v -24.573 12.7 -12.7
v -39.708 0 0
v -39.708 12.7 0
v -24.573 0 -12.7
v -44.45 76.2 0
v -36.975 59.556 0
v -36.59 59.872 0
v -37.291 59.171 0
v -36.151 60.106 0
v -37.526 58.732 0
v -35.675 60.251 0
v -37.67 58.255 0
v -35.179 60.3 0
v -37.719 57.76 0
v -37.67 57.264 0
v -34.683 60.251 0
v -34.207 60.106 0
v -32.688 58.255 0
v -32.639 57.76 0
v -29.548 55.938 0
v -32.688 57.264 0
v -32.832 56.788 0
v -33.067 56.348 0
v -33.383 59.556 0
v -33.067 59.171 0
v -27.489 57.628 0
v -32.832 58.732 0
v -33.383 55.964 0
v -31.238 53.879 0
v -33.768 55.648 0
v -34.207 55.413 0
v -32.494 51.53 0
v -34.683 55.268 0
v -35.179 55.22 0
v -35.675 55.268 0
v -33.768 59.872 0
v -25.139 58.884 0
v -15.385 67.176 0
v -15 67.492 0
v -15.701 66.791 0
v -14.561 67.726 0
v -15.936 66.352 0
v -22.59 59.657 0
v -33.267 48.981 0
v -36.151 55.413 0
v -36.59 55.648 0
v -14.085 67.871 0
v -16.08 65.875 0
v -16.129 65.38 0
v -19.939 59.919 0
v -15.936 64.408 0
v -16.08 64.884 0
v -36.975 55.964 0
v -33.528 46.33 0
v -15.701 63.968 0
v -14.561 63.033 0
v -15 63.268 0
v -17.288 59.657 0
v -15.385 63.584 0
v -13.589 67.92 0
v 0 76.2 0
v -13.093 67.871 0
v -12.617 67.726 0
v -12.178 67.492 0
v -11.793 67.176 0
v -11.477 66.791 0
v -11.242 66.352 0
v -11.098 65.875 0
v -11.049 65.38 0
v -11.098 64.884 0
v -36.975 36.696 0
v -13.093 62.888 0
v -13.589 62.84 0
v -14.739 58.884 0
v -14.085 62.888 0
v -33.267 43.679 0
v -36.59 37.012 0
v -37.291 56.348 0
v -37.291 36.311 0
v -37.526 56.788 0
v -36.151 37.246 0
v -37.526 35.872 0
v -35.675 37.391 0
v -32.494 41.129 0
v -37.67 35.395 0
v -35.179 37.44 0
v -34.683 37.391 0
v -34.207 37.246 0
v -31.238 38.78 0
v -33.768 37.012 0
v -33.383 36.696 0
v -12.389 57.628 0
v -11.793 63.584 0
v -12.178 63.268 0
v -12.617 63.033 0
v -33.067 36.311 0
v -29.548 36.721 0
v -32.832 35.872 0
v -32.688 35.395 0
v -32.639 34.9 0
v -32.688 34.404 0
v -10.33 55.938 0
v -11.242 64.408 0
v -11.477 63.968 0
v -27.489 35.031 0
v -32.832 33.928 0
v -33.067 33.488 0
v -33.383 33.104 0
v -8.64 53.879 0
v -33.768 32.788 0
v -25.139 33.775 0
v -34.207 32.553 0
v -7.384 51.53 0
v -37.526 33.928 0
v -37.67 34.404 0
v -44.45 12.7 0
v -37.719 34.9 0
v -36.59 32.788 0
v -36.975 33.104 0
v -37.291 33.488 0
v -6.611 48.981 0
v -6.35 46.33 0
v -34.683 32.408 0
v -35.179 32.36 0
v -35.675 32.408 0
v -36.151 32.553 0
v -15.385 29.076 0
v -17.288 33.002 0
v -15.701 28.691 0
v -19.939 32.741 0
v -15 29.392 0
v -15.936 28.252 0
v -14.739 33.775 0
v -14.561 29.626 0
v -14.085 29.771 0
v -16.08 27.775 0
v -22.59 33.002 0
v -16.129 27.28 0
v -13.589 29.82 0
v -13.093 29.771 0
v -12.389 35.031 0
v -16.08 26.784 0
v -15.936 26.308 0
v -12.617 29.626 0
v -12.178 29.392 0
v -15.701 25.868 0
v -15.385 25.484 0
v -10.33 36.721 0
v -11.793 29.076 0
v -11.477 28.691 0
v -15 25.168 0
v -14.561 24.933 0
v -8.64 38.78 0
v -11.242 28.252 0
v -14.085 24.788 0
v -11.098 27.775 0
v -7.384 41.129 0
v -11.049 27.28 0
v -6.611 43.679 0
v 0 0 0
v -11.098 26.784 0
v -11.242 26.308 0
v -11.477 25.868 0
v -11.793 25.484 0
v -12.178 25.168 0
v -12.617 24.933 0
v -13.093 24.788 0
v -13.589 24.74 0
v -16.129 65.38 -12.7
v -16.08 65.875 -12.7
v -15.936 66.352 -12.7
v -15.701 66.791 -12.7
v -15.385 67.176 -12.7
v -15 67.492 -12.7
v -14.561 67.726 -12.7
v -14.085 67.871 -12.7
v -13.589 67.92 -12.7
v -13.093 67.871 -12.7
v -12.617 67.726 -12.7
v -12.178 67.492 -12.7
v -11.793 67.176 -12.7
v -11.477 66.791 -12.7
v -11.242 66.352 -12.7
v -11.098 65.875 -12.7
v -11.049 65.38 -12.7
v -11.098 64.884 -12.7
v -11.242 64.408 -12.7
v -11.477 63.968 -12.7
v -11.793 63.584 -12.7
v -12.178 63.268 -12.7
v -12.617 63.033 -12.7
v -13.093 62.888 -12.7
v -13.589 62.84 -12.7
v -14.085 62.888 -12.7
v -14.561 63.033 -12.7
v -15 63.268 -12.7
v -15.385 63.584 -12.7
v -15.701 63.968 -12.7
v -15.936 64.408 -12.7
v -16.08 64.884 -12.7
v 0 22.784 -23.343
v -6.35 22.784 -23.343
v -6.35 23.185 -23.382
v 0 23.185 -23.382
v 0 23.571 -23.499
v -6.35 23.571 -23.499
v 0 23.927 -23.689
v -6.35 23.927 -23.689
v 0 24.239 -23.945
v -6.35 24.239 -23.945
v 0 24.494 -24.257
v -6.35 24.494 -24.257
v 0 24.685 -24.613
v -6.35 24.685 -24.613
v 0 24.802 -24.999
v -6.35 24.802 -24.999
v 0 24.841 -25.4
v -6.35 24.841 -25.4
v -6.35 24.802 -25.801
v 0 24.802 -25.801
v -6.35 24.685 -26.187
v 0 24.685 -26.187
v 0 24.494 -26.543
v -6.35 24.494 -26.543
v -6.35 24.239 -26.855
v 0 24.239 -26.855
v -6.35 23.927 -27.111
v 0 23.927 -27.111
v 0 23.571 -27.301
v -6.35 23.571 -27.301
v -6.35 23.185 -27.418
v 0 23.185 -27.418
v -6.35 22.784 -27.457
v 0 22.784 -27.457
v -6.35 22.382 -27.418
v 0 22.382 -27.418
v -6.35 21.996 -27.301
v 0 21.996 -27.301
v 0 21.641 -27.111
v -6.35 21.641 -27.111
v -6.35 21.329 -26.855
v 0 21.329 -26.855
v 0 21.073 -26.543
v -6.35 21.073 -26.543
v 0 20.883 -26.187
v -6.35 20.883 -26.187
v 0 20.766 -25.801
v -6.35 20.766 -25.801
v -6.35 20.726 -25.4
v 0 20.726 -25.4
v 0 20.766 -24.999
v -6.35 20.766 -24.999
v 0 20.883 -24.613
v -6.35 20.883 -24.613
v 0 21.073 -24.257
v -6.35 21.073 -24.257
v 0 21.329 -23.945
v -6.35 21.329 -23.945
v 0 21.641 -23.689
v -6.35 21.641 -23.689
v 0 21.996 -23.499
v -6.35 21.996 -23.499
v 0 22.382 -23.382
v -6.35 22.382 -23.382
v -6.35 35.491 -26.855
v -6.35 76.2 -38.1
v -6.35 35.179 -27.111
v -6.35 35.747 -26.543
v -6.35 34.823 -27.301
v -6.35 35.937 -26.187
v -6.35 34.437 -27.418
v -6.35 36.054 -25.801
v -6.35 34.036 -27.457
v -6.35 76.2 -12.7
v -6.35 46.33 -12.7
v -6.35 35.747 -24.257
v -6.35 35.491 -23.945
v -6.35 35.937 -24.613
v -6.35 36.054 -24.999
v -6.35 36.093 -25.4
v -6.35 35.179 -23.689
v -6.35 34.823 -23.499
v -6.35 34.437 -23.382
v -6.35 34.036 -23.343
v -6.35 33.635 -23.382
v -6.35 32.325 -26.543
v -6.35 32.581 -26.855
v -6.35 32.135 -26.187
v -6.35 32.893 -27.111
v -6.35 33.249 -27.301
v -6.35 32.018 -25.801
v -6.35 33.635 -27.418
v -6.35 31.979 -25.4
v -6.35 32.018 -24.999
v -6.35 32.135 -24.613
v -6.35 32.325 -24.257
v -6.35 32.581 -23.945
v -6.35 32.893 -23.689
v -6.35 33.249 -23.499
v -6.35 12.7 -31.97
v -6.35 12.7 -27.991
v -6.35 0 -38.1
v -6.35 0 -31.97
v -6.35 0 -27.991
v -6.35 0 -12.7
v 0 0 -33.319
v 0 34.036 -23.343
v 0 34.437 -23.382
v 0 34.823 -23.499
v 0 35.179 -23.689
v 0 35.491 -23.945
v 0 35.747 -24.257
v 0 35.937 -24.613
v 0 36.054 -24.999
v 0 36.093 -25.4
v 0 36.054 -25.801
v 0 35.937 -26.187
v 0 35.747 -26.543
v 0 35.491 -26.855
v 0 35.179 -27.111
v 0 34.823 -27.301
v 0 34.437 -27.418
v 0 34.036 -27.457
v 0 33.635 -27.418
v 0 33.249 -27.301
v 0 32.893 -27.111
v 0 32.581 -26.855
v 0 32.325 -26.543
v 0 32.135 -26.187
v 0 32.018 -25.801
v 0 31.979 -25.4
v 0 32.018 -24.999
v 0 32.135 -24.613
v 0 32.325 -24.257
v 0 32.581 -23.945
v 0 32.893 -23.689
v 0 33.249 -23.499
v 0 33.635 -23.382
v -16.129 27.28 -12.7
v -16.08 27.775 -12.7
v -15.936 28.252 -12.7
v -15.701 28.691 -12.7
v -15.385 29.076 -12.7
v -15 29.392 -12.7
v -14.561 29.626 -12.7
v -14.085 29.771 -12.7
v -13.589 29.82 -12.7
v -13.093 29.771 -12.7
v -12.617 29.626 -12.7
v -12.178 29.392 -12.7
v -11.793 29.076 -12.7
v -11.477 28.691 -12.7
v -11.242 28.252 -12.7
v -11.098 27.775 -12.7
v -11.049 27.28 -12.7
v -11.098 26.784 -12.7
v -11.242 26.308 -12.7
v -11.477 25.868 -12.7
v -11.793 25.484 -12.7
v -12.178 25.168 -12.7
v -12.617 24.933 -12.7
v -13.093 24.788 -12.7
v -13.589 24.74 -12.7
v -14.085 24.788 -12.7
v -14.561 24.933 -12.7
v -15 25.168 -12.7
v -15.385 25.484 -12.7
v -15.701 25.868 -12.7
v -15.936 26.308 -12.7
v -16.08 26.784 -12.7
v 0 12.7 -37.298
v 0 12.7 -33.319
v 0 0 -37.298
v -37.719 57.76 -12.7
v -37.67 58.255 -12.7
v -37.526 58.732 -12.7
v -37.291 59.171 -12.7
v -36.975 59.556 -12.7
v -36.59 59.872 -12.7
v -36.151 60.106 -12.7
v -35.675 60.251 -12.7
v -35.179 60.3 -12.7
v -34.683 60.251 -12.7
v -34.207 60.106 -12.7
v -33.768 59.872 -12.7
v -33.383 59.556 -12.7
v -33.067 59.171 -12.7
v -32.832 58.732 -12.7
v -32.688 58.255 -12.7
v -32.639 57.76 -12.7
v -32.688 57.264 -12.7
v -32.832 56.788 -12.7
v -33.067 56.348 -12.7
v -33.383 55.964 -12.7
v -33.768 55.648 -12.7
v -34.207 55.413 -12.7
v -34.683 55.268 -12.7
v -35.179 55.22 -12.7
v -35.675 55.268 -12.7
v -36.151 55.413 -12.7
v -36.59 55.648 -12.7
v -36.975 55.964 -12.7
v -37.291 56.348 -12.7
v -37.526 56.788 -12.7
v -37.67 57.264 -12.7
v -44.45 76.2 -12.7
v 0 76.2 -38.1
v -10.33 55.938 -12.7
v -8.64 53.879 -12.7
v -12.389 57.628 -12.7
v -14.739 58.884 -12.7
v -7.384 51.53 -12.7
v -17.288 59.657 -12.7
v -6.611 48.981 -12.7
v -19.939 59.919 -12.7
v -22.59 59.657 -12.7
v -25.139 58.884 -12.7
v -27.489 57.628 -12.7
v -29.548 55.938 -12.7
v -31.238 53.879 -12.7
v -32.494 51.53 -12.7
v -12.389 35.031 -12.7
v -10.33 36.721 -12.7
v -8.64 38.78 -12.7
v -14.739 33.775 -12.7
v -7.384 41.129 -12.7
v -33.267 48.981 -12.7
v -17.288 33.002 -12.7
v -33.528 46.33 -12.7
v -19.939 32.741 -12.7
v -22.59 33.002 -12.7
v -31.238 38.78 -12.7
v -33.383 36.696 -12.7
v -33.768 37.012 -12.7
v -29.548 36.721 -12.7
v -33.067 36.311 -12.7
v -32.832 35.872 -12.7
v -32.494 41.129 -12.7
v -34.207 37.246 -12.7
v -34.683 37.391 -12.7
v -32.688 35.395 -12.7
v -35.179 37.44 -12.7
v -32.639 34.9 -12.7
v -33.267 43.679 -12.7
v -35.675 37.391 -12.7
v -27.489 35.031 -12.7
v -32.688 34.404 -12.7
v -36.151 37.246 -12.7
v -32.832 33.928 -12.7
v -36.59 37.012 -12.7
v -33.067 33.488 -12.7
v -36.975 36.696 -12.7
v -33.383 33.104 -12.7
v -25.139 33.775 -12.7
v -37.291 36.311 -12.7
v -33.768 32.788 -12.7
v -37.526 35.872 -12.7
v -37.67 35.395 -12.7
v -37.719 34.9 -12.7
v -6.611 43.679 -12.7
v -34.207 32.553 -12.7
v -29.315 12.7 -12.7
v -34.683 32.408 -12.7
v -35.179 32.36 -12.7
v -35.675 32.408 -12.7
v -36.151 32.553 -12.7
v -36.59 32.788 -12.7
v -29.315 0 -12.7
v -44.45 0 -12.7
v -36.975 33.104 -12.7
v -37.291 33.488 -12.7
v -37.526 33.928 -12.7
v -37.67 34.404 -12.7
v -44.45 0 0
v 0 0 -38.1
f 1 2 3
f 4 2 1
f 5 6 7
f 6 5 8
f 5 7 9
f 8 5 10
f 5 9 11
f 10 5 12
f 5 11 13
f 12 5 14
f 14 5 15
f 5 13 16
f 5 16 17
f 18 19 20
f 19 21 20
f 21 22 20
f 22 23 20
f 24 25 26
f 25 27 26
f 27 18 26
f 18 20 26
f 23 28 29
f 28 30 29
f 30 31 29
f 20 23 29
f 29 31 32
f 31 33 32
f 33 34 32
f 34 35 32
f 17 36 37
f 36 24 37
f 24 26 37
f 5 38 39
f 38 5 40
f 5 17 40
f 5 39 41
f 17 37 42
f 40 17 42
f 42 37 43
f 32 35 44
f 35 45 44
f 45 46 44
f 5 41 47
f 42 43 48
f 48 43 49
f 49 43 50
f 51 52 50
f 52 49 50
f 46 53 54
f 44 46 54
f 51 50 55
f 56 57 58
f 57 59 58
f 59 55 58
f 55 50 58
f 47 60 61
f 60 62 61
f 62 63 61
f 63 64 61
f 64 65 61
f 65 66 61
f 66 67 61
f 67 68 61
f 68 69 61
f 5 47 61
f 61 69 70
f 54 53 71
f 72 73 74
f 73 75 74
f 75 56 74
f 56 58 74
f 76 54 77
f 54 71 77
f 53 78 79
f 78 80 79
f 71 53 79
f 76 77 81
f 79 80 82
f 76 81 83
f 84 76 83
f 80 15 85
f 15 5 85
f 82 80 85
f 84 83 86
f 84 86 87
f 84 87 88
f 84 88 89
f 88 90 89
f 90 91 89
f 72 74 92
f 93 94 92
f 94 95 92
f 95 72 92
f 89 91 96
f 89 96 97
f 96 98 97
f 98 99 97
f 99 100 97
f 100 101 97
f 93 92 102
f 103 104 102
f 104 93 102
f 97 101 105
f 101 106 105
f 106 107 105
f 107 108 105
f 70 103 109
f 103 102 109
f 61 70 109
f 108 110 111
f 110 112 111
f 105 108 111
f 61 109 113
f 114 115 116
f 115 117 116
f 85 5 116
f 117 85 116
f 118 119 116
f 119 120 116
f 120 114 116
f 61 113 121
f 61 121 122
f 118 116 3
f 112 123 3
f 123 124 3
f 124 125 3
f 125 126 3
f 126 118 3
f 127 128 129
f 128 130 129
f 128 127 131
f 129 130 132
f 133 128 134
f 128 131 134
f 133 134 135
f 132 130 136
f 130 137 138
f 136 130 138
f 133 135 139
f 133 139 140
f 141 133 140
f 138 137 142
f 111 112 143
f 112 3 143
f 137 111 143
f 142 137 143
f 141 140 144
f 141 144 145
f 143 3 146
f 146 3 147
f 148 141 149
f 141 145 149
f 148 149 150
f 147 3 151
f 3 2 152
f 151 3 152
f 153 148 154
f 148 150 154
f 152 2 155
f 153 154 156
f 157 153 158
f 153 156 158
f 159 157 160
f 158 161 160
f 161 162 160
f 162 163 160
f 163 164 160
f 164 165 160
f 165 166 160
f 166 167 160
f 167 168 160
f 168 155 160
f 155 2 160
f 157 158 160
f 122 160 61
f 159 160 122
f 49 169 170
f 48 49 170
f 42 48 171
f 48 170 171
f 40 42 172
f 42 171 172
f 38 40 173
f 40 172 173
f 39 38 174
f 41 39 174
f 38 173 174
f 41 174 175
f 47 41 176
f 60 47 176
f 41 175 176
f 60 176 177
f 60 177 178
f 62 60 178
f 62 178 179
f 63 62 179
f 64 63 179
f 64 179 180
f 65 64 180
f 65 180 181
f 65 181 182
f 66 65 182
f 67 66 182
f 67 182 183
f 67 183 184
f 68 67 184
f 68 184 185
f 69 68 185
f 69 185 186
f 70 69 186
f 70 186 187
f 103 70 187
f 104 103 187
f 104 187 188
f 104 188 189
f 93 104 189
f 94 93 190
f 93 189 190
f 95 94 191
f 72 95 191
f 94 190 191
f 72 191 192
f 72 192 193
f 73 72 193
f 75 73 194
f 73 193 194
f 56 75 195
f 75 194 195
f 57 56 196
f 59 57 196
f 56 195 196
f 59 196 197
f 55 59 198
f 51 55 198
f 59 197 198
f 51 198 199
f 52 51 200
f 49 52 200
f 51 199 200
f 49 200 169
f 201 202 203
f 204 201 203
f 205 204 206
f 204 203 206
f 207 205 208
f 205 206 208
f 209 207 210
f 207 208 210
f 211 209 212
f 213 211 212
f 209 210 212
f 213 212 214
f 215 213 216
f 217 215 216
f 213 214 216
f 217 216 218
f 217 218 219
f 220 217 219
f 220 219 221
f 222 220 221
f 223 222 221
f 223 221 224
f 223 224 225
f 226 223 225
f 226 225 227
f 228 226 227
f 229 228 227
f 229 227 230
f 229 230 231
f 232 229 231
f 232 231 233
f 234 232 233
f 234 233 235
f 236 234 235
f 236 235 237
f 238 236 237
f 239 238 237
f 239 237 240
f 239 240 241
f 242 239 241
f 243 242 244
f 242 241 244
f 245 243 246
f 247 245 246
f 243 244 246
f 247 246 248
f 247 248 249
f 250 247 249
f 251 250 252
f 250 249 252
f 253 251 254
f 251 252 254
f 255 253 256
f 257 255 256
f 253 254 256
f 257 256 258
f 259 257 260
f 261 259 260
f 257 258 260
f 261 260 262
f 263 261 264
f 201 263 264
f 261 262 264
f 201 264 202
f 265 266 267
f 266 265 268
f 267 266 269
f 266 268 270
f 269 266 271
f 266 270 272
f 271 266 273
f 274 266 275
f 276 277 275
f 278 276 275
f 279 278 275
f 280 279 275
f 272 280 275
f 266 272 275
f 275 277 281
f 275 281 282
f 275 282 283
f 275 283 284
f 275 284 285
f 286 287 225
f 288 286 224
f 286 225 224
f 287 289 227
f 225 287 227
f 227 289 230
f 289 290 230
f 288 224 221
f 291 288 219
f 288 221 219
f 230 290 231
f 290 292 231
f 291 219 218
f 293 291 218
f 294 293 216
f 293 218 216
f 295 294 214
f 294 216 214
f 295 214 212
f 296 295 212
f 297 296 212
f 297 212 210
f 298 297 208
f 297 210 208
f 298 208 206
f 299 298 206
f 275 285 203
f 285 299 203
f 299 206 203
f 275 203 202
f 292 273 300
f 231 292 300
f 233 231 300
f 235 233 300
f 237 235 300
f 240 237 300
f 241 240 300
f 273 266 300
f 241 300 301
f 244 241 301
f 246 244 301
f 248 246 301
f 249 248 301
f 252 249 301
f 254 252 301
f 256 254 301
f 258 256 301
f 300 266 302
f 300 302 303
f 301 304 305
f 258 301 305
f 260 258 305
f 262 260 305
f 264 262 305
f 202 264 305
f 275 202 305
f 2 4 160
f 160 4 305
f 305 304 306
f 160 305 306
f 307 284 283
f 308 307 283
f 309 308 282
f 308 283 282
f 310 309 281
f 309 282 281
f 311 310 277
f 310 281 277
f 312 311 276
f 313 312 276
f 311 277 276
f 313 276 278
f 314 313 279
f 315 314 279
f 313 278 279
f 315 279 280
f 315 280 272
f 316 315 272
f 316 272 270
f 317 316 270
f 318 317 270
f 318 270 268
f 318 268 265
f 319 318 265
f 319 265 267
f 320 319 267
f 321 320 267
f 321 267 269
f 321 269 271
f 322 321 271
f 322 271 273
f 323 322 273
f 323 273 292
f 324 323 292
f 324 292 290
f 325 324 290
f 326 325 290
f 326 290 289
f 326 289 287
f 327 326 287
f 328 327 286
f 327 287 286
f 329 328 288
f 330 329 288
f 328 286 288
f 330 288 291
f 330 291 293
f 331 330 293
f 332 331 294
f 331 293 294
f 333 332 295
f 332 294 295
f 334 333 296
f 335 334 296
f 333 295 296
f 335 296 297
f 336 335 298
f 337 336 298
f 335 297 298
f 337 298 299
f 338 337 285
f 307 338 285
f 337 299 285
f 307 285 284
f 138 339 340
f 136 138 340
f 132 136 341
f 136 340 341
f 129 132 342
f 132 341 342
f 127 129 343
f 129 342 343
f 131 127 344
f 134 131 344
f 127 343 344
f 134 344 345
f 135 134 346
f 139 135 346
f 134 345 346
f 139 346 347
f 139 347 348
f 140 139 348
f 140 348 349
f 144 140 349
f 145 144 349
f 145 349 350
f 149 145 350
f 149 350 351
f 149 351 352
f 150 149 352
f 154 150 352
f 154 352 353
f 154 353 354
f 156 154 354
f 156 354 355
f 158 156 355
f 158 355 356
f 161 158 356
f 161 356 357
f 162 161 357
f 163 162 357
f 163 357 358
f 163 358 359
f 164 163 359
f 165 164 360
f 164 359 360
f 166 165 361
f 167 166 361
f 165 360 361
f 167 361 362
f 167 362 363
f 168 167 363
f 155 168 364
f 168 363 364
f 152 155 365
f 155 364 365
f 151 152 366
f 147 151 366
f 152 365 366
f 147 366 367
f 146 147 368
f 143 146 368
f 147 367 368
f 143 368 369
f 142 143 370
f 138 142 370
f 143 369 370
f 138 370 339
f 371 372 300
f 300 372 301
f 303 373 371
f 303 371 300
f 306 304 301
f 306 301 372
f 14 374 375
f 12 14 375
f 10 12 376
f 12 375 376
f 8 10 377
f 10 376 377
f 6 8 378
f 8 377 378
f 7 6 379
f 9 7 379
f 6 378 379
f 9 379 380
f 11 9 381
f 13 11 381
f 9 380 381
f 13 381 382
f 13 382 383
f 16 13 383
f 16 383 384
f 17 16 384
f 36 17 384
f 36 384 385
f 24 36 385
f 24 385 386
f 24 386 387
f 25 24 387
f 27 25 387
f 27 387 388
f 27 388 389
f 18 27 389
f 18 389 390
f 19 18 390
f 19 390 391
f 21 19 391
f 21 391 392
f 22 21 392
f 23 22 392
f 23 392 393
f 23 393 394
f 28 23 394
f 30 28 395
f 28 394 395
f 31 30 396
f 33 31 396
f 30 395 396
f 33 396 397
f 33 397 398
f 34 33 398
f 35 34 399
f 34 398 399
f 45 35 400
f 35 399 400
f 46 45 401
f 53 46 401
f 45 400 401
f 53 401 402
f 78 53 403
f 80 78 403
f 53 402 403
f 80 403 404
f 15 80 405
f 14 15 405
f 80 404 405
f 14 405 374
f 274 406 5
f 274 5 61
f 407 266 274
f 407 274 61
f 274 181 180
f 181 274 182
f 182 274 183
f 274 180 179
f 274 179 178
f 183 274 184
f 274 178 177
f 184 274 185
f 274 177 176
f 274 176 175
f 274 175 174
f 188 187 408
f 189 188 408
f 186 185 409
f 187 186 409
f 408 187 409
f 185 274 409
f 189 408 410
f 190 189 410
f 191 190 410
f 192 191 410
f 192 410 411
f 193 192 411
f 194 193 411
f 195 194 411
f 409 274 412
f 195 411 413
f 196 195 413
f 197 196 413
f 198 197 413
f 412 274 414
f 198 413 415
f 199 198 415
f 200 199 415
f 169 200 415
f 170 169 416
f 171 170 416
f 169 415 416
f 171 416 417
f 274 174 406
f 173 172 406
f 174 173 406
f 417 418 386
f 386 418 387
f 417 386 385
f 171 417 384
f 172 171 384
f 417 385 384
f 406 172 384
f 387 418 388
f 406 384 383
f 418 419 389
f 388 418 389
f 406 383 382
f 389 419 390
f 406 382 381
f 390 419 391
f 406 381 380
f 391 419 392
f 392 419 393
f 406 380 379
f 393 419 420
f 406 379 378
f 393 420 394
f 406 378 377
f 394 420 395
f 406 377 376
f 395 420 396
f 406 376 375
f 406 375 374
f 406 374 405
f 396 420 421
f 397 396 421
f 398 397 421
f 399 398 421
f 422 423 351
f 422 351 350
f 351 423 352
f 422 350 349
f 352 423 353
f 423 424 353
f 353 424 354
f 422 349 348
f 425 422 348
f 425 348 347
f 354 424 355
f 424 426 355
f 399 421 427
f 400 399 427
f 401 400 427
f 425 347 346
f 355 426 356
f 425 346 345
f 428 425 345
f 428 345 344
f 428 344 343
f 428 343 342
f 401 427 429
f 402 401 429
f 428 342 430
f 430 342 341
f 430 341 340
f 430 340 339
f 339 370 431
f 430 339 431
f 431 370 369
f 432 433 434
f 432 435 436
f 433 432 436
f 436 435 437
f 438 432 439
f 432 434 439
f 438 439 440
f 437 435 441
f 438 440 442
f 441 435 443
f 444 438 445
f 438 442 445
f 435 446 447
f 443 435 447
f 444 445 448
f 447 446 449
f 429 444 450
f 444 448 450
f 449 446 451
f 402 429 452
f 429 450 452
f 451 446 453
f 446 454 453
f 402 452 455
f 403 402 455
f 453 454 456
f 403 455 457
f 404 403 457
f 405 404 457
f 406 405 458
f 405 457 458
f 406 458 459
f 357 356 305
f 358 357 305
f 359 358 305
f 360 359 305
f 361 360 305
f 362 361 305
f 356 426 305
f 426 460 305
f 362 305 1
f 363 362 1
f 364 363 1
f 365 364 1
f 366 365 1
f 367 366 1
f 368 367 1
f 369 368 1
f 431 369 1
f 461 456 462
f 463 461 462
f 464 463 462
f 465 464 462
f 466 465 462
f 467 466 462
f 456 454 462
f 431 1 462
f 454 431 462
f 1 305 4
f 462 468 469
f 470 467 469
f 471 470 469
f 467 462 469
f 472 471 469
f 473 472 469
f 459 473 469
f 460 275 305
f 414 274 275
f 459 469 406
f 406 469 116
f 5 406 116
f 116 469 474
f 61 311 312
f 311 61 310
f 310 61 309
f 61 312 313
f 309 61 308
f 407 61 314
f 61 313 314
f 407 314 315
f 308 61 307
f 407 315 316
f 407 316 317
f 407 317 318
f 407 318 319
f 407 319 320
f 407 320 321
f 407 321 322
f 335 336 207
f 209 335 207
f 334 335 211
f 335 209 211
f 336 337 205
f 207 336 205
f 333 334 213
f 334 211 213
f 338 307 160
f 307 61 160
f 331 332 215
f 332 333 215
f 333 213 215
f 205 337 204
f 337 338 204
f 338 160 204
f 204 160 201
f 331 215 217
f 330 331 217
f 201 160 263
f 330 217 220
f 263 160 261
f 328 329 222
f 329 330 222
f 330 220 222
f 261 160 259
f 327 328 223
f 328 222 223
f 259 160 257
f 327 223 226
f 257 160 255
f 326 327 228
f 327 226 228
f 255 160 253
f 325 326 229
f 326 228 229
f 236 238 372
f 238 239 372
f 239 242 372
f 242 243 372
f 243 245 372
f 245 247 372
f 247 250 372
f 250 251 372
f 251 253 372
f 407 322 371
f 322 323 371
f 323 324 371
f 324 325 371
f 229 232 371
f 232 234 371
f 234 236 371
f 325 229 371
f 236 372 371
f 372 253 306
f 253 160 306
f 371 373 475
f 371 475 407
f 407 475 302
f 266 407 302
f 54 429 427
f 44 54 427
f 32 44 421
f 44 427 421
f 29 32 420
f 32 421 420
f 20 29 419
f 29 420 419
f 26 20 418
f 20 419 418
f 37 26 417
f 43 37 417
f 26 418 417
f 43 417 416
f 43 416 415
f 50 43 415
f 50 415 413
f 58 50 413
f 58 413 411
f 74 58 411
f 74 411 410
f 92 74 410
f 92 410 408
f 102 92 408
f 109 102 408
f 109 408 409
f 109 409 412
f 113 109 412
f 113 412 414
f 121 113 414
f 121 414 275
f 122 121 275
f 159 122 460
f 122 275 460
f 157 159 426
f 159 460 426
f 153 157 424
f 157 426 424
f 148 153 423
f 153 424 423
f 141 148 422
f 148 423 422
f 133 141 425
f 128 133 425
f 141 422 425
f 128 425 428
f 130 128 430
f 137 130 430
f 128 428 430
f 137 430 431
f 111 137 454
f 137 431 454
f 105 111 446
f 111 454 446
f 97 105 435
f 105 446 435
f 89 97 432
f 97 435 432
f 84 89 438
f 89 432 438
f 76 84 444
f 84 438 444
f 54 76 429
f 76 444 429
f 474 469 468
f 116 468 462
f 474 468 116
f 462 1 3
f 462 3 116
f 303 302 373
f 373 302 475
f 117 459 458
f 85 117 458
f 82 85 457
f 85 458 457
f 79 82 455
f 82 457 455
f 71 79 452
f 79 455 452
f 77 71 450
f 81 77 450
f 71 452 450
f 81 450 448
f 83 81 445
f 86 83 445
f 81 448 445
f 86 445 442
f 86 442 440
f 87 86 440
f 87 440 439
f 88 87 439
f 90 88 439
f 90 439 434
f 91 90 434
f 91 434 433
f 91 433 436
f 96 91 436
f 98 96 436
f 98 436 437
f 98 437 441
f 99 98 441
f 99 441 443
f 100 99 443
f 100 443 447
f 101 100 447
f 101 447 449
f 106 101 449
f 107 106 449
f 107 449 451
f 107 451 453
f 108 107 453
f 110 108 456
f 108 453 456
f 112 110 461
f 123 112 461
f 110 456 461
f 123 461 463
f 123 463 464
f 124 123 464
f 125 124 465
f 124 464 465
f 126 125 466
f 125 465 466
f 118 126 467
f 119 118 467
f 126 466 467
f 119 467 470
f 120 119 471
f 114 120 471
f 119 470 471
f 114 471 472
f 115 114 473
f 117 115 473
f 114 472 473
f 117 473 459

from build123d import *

# Parameters (mm, degrees)
BOSS_EXTRUDE1_DEPTH = 76.2
SKETCH4_R           = 2.0574
CUT_EXTRUDE3_DEPTH  = 7.35
SKETCH3_R           = 13.589
SKETCH3_R_2         = 2.54
CUT_EXTRUDE2_DEPTH  = 13.7
CUT_EXTRUDE4_DEPTH  = 12.7


with BuildPart() as part:
    # Sketch1 → Boss-Extrude1 (new body)
    with BuildSketch(Plane(origin=(0, 0, 0), x_dir=(1, 0, 0), z_dir=(0, 1, 0))):
        Polygon((-44.45, 12.7), (-44.45, 0), (0, 0), (0, 38.1), (-6.35, 38.1), (-6.35, 12.7), align=None)
    extrude(amount=BOSS_EXTRUDE1_DEPTH)

    # Sketch4 → Cut-Extrude3 (cut, through all)
    with BuildSketch(Plane.ZY.offset(6.35)):
        with Locations((-25.4, 22.7838)):
            Circle(SKETCH4_R)
        with Locations((-25.4, 34.036)):
            Circle(SKETCH4_R)
    extrude(amount=-CUT_EXTRUDE3_DEPTH, mode=Mode.SUBTRACT)

    # Sketch3 → Cut-Extrude2 (cut, through all)
    with BuildSketch(Plane(origin=(0, 0, -12.7), x_dir=(-1, 0, 0), z_dir=(0, 0, -1))):
        with Locations((19.939, 46.3296)):
            Circle(SKETCH3_R)
        with Locations((35.179, 57.7596)):
            Circle(SKETCH3_R_2)
        with Locations((13.589, 65.3796)):
            Circle(SKETCH3_R_2)
        with Locations((13.589, 27.2796)):
            Circle(SKETCH3_R_2)
        with Locations((35.179, 34.8996)):
            Circle(SKETCH3_R_2)
    extrude(amount=-CUT_EXTRUDE2_DEPTH, mode=Mode.SUBTRACT)

    # Sketch6 → Cut-Extrude4 (cut)
    with BuildSketch(Plane.XZ):
        Polygon((-47.891108231, 6.866314065), (10.481478335, -42.114101793), (8.522261701, -44.449005256), (-49.850324865, 4.531410602), align=None)
    extrude(amount=-CUT_EXTRUDE4_DEPTH, mode=Mode.SUBTRACT)


solid = part.part
